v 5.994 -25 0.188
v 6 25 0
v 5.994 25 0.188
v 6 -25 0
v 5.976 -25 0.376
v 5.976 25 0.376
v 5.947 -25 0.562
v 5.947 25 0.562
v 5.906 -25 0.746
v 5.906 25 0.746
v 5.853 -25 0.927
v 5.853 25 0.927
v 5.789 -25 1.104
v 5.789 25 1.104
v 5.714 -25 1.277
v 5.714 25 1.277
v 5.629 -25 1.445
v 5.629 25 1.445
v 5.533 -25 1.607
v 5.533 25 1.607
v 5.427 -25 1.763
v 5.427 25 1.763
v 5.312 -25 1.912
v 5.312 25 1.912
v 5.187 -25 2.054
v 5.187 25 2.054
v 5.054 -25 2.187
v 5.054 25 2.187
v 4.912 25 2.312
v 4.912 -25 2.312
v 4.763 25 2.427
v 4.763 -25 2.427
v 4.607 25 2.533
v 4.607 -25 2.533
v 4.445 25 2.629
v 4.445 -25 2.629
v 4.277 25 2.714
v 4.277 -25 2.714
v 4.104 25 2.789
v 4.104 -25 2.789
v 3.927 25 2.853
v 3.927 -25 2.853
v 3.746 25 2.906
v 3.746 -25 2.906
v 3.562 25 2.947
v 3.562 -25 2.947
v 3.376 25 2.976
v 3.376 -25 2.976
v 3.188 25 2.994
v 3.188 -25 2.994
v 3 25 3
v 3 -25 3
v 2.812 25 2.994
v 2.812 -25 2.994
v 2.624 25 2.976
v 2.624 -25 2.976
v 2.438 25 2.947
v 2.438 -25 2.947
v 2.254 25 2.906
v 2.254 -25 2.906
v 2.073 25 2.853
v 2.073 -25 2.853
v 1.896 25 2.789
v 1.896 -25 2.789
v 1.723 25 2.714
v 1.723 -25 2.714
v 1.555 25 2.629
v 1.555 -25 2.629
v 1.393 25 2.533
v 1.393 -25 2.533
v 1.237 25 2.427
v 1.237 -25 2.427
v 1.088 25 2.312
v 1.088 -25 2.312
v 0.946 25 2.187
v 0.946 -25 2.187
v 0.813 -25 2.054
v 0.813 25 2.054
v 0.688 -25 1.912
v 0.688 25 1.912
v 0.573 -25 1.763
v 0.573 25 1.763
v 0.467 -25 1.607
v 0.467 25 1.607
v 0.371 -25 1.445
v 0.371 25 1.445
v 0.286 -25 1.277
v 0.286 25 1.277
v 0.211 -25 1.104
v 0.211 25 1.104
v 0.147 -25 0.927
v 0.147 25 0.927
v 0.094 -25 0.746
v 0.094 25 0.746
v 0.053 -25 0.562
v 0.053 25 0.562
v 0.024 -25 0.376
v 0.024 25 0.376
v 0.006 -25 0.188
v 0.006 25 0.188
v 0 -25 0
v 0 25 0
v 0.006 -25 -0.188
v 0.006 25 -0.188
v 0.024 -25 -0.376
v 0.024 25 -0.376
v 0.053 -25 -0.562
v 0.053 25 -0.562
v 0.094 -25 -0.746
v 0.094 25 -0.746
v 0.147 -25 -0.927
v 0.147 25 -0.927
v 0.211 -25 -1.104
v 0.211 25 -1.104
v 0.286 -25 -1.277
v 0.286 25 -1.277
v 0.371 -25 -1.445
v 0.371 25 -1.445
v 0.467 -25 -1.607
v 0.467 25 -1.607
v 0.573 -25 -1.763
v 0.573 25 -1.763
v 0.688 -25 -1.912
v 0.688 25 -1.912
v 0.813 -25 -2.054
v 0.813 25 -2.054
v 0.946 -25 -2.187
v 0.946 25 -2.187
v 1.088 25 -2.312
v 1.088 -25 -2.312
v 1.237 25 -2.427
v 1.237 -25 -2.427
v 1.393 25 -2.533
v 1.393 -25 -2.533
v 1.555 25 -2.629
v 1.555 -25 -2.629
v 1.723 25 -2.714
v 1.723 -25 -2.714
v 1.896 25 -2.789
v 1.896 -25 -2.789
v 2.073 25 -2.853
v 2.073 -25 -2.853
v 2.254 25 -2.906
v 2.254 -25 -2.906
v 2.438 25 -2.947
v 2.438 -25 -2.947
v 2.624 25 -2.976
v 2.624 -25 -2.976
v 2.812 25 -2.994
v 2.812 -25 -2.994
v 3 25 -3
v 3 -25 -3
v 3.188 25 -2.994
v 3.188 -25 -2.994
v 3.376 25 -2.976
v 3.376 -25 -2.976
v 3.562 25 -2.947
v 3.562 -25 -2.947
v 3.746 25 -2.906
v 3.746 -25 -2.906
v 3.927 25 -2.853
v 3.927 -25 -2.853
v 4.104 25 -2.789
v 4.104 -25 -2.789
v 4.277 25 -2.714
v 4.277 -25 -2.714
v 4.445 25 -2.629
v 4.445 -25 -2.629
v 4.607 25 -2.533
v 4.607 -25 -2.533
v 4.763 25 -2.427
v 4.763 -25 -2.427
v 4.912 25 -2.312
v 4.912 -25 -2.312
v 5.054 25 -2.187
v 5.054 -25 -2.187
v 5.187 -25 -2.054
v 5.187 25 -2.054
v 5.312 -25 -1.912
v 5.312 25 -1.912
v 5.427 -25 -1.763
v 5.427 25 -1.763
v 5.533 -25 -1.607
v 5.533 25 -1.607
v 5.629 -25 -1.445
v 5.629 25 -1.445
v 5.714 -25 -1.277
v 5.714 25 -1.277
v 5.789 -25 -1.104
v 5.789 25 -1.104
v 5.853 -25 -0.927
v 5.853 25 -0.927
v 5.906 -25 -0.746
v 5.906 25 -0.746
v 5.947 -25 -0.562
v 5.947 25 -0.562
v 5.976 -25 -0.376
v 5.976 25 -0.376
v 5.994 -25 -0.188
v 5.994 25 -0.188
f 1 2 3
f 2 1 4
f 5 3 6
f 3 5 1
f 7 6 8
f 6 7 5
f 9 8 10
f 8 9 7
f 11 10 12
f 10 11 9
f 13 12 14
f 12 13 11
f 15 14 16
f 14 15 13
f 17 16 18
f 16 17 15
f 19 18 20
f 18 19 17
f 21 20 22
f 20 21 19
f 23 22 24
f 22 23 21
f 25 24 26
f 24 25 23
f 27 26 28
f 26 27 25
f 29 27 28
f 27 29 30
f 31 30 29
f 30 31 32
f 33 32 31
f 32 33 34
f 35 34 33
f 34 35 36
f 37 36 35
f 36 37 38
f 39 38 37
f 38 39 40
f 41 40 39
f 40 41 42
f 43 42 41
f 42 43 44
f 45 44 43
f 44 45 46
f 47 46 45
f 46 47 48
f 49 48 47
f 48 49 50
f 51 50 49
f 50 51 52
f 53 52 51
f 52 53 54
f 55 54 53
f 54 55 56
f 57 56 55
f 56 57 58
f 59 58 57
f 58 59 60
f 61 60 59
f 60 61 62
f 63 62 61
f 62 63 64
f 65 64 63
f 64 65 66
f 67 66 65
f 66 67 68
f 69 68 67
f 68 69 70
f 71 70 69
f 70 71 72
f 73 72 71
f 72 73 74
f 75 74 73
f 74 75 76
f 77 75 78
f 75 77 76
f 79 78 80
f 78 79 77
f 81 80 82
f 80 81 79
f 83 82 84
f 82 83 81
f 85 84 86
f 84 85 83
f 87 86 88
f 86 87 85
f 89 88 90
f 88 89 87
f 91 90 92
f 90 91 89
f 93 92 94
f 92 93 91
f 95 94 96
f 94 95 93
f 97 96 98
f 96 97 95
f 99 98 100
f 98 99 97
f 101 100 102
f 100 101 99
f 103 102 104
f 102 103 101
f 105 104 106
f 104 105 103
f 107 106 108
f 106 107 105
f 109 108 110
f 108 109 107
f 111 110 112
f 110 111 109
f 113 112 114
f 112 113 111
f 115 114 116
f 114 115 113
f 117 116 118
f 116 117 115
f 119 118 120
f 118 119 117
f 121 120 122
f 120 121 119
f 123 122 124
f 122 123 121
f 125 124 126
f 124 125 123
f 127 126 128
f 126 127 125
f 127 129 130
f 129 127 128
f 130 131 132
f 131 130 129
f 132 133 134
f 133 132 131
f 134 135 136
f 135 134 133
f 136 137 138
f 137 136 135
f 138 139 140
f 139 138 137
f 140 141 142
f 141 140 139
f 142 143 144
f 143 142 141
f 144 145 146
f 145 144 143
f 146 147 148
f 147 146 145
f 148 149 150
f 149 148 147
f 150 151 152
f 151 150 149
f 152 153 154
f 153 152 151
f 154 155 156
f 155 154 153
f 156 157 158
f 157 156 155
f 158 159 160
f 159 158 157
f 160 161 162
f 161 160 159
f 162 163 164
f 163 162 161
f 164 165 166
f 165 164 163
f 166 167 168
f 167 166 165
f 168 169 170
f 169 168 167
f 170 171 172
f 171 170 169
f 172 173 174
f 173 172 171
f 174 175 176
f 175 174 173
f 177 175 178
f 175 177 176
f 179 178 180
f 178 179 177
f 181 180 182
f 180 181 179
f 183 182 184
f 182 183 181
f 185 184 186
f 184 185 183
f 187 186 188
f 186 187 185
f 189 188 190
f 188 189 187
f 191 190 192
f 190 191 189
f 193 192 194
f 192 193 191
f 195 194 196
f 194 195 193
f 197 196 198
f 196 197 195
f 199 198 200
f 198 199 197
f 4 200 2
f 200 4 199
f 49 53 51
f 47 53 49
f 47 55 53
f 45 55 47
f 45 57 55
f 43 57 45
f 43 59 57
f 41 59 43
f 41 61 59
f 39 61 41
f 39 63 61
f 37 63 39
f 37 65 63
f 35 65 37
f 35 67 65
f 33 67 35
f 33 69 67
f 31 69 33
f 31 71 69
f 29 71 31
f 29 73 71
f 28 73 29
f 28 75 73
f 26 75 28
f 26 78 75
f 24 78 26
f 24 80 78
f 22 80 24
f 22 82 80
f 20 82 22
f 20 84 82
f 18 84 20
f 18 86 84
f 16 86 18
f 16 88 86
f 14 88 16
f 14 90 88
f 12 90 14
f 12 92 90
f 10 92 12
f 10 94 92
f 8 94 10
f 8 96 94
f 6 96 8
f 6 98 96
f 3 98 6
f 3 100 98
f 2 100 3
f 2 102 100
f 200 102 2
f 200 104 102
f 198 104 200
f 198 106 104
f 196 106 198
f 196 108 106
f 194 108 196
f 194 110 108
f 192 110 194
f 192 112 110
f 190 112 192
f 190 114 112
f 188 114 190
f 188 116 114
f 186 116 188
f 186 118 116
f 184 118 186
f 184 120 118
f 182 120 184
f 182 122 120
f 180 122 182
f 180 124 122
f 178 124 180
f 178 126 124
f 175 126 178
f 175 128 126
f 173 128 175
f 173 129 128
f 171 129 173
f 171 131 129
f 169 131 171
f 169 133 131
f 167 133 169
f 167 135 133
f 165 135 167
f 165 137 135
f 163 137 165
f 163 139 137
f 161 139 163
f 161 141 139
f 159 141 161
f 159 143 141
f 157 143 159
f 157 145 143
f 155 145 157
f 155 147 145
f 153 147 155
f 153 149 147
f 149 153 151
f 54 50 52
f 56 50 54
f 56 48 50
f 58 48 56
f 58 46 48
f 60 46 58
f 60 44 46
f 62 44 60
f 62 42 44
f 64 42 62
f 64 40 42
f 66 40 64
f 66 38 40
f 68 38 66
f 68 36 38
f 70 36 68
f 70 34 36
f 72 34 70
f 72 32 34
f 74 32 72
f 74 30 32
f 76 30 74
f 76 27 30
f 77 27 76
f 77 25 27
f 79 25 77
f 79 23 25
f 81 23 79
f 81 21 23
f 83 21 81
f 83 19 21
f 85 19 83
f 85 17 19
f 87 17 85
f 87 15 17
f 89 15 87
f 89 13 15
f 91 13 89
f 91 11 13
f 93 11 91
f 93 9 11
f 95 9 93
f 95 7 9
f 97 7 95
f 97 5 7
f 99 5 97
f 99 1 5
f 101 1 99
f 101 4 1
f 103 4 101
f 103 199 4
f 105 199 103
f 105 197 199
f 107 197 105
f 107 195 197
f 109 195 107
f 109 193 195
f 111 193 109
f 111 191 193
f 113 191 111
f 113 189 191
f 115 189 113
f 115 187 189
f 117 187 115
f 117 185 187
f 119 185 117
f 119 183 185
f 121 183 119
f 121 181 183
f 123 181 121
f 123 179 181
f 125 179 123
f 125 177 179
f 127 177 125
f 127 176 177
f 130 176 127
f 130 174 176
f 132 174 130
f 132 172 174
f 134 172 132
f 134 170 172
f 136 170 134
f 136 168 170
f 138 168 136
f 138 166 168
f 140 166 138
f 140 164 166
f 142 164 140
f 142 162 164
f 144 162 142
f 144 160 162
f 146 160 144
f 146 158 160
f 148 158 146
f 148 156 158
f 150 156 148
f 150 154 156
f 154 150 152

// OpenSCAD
$fn=100;
translate([3,25,0])
rotate([90,0,0])
    cylinder(50,3,3);
